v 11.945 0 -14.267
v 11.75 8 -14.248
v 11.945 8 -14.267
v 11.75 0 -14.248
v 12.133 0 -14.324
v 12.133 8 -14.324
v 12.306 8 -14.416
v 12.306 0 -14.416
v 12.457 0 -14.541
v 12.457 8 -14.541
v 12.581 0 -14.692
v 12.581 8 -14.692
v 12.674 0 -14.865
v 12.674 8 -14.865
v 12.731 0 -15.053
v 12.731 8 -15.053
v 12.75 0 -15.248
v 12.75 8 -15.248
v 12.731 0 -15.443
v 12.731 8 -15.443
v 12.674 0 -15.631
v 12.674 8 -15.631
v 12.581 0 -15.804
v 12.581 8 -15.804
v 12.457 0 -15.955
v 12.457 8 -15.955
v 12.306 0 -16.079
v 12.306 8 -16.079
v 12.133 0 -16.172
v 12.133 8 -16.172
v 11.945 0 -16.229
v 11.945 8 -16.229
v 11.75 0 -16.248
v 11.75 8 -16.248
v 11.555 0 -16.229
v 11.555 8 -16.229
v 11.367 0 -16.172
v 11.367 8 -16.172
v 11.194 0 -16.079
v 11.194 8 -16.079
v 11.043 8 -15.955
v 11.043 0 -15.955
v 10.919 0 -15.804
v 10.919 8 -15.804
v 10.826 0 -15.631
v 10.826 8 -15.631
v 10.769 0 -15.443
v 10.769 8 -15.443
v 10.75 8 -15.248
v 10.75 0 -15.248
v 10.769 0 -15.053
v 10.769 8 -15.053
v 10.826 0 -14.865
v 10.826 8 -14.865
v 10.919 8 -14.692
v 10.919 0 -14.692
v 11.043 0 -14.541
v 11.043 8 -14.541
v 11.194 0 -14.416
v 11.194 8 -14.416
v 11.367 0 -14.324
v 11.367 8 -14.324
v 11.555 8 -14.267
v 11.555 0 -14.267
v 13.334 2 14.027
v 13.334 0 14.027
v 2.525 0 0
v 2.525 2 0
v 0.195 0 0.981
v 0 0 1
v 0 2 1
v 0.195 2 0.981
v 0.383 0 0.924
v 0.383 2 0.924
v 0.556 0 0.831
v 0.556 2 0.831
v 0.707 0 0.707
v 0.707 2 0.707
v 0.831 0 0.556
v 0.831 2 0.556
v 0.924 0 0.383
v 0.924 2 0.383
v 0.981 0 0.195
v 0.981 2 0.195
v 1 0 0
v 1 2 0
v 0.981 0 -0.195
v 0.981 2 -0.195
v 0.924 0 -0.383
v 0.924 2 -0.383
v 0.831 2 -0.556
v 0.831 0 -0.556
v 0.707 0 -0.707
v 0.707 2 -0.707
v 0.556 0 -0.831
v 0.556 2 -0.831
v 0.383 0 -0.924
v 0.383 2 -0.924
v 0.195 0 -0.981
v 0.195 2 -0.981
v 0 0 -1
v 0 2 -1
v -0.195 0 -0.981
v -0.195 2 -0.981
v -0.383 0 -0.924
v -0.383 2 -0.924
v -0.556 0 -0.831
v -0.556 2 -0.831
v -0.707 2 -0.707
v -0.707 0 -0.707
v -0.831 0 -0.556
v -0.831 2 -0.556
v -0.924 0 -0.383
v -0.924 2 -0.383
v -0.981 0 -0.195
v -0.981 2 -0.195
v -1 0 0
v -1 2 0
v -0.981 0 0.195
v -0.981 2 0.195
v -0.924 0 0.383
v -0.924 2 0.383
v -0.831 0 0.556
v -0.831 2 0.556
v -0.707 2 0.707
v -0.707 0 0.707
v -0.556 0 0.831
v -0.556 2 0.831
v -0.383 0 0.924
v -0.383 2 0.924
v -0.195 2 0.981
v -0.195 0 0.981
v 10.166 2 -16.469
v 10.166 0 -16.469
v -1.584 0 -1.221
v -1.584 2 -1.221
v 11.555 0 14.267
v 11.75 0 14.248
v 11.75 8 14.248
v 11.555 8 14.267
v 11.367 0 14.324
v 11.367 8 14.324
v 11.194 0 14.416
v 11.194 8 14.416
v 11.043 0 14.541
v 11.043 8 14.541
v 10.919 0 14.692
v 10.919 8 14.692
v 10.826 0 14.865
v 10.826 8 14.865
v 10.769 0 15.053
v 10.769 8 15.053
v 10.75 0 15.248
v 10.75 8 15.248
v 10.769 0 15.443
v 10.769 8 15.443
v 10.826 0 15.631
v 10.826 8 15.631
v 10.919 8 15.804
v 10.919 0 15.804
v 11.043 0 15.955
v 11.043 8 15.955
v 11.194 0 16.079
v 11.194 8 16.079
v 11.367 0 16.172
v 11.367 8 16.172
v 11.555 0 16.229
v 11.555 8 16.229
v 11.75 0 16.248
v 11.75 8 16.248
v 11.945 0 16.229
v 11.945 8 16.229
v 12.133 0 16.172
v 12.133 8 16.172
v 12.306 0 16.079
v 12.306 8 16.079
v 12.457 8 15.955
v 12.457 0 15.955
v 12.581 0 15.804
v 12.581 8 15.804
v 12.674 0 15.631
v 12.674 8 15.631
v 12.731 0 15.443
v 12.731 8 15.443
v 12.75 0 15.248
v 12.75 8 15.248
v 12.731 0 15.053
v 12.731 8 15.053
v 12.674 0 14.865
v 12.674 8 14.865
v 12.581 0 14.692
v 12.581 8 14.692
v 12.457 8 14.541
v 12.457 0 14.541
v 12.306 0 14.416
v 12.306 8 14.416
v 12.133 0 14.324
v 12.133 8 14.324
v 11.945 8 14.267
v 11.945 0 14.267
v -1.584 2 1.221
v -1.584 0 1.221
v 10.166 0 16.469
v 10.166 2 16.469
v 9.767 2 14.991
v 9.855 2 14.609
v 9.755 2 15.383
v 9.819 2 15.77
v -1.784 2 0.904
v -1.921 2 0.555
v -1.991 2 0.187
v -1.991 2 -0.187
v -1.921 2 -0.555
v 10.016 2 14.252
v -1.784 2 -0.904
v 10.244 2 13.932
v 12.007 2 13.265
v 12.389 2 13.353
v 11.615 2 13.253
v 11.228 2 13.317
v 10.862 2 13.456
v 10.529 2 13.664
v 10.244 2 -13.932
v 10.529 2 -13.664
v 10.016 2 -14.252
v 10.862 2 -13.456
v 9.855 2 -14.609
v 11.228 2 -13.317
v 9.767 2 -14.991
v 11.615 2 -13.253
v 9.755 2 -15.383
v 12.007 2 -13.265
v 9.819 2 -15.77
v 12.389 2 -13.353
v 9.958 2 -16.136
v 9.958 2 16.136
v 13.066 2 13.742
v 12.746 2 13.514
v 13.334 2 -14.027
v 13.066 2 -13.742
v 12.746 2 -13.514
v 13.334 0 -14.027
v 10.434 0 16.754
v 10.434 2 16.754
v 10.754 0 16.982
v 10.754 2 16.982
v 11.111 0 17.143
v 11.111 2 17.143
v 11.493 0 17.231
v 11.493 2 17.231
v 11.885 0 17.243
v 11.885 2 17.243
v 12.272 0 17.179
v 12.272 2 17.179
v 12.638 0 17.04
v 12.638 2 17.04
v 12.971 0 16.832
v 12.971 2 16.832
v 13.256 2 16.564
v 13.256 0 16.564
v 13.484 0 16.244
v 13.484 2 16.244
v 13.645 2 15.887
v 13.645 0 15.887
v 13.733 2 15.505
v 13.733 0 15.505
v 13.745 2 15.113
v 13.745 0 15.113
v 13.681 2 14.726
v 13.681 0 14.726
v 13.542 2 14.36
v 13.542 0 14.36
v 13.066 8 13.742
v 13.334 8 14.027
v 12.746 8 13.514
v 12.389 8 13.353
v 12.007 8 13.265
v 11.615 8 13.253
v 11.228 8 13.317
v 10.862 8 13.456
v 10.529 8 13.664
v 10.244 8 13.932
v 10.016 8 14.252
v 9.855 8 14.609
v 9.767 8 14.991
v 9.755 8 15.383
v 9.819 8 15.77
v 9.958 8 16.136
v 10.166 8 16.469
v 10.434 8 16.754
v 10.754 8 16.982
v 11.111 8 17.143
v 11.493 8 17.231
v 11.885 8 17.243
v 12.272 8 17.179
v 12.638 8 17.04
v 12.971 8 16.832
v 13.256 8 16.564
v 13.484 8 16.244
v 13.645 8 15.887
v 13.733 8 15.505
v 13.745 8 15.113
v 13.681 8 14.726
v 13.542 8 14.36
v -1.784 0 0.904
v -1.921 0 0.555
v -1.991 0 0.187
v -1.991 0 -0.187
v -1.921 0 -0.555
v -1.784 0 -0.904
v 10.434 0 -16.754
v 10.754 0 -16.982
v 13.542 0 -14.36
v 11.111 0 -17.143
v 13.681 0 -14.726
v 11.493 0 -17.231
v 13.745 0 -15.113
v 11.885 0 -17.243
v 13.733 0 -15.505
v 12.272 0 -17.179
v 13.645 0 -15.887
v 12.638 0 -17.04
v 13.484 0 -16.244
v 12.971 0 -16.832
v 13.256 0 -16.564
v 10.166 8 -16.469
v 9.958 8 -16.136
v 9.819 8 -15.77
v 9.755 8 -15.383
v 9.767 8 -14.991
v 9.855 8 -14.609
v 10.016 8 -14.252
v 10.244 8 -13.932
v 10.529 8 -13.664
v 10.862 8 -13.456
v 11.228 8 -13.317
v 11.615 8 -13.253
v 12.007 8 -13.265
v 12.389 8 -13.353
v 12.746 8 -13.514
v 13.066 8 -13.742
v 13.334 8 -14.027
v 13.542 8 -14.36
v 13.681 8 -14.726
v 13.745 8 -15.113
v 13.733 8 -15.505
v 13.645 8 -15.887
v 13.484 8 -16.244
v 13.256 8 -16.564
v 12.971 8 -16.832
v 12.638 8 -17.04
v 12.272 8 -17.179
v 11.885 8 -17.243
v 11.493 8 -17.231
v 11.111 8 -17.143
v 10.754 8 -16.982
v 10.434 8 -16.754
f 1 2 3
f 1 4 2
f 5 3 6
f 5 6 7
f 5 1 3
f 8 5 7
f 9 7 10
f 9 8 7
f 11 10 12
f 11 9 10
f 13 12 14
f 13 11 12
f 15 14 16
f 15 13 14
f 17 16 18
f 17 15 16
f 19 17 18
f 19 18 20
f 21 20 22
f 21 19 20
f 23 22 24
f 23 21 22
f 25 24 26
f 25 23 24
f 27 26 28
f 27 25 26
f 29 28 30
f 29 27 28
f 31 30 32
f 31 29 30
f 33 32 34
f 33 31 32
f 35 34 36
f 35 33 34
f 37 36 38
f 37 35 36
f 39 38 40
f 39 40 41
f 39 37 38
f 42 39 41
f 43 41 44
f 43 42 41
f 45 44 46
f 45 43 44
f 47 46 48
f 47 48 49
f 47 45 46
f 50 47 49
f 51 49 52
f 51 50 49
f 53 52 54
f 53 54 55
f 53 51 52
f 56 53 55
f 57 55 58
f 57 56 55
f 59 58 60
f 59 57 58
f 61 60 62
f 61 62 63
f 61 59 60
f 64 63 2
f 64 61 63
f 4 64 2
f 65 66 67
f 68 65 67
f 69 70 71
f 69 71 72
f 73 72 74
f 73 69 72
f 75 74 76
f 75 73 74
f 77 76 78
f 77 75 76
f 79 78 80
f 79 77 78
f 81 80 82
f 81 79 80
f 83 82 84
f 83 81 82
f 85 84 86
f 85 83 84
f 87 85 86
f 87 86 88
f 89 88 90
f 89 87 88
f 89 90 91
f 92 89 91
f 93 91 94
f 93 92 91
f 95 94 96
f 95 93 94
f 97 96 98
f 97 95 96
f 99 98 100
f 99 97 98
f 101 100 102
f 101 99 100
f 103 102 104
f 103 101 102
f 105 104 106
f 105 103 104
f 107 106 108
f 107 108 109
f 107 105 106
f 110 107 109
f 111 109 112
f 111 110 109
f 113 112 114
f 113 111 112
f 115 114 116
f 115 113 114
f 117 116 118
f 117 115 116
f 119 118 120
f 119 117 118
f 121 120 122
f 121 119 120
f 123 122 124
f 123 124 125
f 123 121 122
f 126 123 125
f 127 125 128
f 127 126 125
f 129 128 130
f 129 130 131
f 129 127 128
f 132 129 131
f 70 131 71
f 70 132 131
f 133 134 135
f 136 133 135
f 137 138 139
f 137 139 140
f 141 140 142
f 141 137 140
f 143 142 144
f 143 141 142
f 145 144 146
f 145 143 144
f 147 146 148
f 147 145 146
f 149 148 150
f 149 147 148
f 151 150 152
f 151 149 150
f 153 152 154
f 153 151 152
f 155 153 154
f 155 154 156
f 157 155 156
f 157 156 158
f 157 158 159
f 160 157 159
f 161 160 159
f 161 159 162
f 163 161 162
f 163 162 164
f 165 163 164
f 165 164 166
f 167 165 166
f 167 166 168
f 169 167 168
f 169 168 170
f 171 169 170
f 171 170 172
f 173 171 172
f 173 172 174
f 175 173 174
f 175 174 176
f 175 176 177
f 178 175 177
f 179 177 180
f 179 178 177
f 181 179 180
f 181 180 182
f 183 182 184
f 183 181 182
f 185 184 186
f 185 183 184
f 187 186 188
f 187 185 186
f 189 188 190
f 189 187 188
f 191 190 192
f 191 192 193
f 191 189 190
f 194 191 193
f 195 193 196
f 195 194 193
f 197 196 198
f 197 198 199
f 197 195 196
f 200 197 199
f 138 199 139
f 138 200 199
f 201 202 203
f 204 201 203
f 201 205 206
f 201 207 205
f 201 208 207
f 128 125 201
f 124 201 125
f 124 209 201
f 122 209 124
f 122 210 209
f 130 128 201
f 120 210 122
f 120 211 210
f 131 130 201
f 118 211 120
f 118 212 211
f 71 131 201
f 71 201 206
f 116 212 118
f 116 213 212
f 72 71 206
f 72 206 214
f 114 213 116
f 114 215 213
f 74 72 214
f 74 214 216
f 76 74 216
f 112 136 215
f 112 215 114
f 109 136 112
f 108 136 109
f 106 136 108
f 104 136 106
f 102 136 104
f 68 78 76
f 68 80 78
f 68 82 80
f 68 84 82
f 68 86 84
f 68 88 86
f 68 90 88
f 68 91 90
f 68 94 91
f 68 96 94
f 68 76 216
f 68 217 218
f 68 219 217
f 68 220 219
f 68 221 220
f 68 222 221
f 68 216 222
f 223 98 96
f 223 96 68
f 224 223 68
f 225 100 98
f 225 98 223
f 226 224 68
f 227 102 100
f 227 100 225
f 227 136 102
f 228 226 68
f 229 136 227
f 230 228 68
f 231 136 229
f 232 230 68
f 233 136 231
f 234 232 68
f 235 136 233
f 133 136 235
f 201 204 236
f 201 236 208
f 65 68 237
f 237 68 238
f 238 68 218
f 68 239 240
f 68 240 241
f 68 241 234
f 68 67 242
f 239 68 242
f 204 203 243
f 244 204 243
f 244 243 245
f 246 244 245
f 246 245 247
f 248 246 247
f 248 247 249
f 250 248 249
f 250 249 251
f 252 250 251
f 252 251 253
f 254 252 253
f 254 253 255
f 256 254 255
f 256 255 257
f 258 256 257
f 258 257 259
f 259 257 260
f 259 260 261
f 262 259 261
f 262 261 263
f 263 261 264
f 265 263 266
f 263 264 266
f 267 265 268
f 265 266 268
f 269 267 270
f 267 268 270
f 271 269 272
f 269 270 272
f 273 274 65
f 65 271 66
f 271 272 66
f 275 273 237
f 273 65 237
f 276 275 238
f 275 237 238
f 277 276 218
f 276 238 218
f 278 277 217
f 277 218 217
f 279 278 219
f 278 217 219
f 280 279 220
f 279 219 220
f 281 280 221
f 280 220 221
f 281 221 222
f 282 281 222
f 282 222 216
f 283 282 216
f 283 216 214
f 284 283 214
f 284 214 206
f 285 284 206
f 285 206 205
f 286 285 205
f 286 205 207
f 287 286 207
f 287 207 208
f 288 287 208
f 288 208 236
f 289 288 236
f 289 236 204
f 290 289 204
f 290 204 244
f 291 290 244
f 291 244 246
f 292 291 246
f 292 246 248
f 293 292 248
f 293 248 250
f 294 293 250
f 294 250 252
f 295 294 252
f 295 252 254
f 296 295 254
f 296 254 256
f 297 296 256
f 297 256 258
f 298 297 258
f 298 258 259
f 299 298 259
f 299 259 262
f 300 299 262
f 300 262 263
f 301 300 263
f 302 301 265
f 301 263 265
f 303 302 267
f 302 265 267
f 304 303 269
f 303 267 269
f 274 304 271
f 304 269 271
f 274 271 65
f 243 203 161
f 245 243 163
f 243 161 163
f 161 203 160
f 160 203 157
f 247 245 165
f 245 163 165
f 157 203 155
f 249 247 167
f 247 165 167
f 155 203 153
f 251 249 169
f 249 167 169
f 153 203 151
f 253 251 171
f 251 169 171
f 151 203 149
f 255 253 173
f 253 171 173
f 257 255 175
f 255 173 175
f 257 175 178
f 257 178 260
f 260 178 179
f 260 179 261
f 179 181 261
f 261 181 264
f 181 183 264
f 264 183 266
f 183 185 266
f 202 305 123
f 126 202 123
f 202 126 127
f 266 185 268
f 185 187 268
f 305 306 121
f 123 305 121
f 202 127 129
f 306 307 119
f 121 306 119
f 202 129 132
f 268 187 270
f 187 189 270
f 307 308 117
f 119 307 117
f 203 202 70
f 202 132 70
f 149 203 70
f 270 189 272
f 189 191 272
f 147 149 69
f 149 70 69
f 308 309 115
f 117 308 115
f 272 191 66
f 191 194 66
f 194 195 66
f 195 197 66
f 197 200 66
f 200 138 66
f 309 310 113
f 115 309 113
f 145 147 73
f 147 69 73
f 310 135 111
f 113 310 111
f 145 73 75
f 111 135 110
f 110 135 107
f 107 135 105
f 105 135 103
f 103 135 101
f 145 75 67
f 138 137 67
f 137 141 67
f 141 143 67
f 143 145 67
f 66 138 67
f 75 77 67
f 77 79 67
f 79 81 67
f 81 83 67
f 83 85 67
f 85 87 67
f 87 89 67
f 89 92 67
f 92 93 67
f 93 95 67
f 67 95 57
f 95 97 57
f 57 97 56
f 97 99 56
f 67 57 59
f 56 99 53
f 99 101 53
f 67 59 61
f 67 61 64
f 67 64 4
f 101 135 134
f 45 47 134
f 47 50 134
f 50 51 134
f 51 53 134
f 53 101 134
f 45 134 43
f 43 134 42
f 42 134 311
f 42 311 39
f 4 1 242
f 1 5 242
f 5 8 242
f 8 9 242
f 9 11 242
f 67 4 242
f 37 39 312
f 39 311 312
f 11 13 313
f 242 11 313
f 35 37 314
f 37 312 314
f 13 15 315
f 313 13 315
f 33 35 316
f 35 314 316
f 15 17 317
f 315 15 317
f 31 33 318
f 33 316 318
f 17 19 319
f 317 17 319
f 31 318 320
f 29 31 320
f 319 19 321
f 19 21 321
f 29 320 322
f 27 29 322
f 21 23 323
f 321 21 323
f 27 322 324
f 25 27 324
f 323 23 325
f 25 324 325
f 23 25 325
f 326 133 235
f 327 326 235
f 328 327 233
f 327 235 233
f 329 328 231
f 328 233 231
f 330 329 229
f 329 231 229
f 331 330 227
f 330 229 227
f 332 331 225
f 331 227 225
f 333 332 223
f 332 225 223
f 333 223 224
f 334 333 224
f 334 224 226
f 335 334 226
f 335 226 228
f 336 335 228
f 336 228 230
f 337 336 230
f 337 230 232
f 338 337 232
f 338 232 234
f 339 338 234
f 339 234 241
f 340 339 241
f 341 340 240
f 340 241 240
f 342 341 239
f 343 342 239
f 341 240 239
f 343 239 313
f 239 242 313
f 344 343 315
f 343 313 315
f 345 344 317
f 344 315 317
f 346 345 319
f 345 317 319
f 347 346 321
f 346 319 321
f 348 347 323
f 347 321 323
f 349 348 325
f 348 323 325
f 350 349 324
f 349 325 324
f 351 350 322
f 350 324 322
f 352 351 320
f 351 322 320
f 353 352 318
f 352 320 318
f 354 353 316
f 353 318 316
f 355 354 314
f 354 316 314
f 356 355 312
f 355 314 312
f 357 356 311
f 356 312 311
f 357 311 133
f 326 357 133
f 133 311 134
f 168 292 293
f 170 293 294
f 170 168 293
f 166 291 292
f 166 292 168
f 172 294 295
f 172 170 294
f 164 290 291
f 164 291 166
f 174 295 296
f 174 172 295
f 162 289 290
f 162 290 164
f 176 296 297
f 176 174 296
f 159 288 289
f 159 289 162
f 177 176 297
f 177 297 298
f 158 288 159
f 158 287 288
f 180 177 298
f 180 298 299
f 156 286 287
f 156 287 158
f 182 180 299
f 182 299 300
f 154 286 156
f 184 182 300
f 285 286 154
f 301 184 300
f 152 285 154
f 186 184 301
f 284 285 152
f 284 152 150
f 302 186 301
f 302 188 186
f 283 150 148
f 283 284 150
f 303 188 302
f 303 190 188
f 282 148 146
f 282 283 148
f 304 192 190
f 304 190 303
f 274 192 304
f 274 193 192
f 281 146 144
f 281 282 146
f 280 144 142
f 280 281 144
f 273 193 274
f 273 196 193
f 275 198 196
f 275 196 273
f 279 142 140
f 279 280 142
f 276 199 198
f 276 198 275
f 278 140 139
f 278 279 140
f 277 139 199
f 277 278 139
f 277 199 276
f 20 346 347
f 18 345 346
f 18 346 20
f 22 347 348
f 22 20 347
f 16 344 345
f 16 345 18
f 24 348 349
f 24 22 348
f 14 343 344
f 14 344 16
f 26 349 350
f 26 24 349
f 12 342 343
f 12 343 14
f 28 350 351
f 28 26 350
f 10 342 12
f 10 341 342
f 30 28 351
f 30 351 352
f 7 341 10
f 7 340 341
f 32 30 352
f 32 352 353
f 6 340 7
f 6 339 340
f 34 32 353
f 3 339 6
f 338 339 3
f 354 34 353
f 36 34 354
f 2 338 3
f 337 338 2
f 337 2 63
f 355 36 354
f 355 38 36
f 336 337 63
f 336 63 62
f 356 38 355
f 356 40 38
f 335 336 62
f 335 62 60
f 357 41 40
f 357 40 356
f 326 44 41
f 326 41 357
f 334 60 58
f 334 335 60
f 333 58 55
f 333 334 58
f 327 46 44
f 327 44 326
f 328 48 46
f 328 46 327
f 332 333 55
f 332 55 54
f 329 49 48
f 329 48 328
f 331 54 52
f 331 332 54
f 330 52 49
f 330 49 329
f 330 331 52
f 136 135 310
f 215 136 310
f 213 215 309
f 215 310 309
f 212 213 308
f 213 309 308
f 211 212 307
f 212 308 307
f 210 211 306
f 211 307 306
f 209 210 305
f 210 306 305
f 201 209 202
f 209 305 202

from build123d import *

# Parameters (mm, degrees)
SKETCH1_R           = 1
BOSS_EXTRUDE1_DEPTH = 2
SKETCH3_R           = 2
SKETCH3_R_2         = 1
BOSS_EXTRUDE3_DEPTH = 6


with BuildPart() as part:
    # Sketch1 → Boss-Extrude1 (new body)
    with BuildSketch(Plane(origin=(0, 0, 0), x_dir=(1, 0, 0), z_dir=(0, 1, 0))):
        with BuildLine():
            Line((10.165797332, 16.468729903), (-1.584202668, 1.220779221))
            ThreePointArc((-1.584202668, 1.220779221), (-2, 0), (-1.584202668, -1.220779221))
            Line((-1.584202668, -1.220779221), (10.165797332, -16.468729903))
            ThreePointArc((10.165797332, -16.468729903), (12.970779221, -16.83215335), (13.334202668, -14.027171461))
            Line((13.334202668, -14.027171461), (2.524929468, 0))
            Line((2.524929468, 0), (13.334202668, 14.027171461))
            ThreePointArc((13.334202668, 14.027171461), (12.970779221, 16.83215335), (10.165797332, 16.468729903))
        make_face()
        with Locations(Location((0, 0, 0), (0, 0, 270))):
            Circle(SKETCH1_R, mode=Mode.SUBTRACT)
        with Locations(Location((11.75, 15.247950682, 0), (0, 0, 270))):
            Circle(SKETCH1_R, mode=Mode.SUBTRACT)
        with Locations(Location((11.75, -15.247950682, 0), (0, 0, 90))):
            Circle(SKETCH1_R, mode=Mode.SUBTRACT)
    extrude(amount=BOSS_EXTRUDE1_DEPTH)

    # Sketch3 → Boss-Extrude3 (add)
    # profile 1 of 2: a face of its own
    with BuildSketch(Plane(origin=(0, 2, 0), x_dir=(1, 0, 0), z_dir=(0, 1, 0))):
        with Locations(Location((11.75, 15.247950682, 0), (0, 0, 142.382320334))):
            Circle(SKETCH3_R)
        with Locations(Location((11.75, 15.247950682, 0), (0, 0, 270))):
            Circle(SKETCH3_R_2, mode=Mode.SUBTRACT)
    # profile 2 of 2: a face of its own
    with BuildSketch(Plane(origin=(0, 2, 0), x_dir=(1, 0, 0), z_dir=(0, 1, 0))):
        with Locations(Location((11.75, -15.247950682, 0), (0, 0, 37.617679666))):
            Circle(SKETCH3_R)
        with Locations(Location((11.75, -15.247950682, 0), (0, 0, 90))):
            Circle(SKETCH3_R_2, mode=Mode.SUBTRACT)
    extrude(amount=BOSS_EXTRUDE3_DEPTH)


solid = part.part
